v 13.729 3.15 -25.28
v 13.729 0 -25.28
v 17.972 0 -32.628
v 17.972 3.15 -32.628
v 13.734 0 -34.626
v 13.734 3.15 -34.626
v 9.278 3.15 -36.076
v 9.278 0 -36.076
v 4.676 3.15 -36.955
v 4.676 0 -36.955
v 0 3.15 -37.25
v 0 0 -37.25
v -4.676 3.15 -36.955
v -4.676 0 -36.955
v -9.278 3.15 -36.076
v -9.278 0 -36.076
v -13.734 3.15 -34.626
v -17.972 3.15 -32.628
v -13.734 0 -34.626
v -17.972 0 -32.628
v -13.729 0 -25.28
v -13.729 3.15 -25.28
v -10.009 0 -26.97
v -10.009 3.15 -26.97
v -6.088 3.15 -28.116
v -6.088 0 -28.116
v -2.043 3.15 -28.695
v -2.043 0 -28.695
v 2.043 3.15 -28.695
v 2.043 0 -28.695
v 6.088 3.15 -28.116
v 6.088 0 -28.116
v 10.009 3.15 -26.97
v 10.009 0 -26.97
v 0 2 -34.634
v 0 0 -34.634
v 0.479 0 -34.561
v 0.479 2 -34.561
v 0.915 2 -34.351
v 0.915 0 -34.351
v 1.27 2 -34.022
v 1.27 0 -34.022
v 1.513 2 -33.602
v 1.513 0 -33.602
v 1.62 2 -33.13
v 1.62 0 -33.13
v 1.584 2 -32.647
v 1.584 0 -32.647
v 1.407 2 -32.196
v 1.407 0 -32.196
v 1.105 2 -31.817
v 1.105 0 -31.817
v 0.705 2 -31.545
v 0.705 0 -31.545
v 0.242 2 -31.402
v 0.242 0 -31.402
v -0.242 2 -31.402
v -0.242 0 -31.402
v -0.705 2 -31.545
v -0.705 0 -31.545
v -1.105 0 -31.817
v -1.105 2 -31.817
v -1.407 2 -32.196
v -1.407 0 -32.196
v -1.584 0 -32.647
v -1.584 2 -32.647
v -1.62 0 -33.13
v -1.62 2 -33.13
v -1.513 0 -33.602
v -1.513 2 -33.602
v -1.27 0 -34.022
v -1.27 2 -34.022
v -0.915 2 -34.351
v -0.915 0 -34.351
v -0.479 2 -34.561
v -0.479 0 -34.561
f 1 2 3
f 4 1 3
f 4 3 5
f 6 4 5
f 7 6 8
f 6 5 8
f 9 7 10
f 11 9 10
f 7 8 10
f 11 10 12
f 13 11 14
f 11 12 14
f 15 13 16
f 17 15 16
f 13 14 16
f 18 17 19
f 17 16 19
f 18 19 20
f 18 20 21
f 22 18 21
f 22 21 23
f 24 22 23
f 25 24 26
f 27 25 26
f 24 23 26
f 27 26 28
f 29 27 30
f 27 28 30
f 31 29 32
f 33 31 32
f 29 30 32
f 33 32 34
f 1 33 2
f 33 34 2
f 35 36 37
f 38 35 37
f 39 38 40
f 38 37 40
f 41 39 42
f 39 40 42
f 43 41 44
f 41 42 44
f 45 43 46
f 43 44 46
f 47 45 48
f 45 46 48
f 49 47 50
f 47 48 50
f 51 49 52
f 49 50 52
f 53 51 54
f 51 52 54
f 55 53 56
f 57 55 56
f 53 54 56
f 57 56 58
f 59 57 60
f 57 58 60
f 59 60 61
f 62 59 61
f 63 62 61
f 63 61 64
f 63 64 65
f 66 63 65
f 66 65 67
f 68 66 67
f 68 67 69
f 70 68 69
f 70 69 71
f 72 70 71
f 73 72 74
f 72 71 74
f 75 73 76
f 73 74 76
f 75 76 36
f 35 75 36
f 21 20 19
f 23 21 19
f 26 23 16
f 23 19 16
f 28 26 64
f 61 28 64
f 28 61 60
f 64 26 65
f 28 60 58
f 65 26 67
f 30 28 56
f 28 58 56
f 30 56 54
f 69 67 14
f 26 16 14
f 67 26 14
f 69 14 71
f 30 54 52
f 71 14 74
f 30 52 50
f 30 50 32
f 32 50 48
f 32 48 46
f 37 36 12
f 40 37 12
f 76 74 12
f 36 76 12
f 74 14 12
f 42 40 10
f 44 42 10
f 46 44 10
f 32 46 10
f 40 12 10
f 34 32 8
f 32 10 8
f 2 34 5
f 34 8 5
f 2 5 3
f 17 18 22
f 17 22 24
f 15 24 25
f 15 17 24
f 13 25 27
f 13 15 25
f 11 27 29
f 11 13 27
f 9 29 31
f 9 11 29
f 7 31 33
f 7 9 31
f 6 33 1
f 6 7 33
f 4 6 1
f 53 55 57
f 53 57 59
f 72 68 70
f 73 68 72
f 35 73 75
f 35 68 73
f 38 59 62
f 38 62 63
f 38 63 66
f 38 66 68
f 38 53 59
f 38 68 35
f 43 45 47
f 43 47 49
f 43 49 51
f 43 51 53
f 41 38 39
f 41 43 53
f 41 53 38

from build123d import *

# Parameters (mm, degrees)
BOSS_EXTRUDE1_DEPTH = 3.15
SKETCH2_R           = 1.625
CUT_EXTRUDE1_DEPTH  = 2


with BuildPart() as part:
    # Sketch1 → Boss-Extrude1 (new body)
    with BuildSketch(Plane(origin=(0, 0, 0), x_dir=(1, 0, 0), z_dir=(0, 1, 0))):
        with BuildLine():
            Line((-17.971705397, 32.627906846), (-13.729256498, 25.279769804))
            ThreePointArc((-13.729256498, 25.279769804), (0, 28.767329478), (13.729256498, 25.279769804))
            Line((13.729256498, 25.279769804), (17.971705397, 32.627906846))
            ThreePointArc((17.971705397, 32.627906846), (0, 37.25), (-17.971705397, 32.627906846))
        make_face()
    extrude(amount=BOSS_EXTRUDE1_DEPTH)

    # Sketch2 → Cut-Extrude1 (cut)
    with BuildSketch(Plane.XZ):
        with Locations(Location((0, -33.008664739, 0), (0, 0, 270))):
            Circle(SKETCH2_R)
    extrude(amount=-CUT_EXTRUDE1_DEPTH, mode=Mode.SUBTRACT)


solid = part.part
